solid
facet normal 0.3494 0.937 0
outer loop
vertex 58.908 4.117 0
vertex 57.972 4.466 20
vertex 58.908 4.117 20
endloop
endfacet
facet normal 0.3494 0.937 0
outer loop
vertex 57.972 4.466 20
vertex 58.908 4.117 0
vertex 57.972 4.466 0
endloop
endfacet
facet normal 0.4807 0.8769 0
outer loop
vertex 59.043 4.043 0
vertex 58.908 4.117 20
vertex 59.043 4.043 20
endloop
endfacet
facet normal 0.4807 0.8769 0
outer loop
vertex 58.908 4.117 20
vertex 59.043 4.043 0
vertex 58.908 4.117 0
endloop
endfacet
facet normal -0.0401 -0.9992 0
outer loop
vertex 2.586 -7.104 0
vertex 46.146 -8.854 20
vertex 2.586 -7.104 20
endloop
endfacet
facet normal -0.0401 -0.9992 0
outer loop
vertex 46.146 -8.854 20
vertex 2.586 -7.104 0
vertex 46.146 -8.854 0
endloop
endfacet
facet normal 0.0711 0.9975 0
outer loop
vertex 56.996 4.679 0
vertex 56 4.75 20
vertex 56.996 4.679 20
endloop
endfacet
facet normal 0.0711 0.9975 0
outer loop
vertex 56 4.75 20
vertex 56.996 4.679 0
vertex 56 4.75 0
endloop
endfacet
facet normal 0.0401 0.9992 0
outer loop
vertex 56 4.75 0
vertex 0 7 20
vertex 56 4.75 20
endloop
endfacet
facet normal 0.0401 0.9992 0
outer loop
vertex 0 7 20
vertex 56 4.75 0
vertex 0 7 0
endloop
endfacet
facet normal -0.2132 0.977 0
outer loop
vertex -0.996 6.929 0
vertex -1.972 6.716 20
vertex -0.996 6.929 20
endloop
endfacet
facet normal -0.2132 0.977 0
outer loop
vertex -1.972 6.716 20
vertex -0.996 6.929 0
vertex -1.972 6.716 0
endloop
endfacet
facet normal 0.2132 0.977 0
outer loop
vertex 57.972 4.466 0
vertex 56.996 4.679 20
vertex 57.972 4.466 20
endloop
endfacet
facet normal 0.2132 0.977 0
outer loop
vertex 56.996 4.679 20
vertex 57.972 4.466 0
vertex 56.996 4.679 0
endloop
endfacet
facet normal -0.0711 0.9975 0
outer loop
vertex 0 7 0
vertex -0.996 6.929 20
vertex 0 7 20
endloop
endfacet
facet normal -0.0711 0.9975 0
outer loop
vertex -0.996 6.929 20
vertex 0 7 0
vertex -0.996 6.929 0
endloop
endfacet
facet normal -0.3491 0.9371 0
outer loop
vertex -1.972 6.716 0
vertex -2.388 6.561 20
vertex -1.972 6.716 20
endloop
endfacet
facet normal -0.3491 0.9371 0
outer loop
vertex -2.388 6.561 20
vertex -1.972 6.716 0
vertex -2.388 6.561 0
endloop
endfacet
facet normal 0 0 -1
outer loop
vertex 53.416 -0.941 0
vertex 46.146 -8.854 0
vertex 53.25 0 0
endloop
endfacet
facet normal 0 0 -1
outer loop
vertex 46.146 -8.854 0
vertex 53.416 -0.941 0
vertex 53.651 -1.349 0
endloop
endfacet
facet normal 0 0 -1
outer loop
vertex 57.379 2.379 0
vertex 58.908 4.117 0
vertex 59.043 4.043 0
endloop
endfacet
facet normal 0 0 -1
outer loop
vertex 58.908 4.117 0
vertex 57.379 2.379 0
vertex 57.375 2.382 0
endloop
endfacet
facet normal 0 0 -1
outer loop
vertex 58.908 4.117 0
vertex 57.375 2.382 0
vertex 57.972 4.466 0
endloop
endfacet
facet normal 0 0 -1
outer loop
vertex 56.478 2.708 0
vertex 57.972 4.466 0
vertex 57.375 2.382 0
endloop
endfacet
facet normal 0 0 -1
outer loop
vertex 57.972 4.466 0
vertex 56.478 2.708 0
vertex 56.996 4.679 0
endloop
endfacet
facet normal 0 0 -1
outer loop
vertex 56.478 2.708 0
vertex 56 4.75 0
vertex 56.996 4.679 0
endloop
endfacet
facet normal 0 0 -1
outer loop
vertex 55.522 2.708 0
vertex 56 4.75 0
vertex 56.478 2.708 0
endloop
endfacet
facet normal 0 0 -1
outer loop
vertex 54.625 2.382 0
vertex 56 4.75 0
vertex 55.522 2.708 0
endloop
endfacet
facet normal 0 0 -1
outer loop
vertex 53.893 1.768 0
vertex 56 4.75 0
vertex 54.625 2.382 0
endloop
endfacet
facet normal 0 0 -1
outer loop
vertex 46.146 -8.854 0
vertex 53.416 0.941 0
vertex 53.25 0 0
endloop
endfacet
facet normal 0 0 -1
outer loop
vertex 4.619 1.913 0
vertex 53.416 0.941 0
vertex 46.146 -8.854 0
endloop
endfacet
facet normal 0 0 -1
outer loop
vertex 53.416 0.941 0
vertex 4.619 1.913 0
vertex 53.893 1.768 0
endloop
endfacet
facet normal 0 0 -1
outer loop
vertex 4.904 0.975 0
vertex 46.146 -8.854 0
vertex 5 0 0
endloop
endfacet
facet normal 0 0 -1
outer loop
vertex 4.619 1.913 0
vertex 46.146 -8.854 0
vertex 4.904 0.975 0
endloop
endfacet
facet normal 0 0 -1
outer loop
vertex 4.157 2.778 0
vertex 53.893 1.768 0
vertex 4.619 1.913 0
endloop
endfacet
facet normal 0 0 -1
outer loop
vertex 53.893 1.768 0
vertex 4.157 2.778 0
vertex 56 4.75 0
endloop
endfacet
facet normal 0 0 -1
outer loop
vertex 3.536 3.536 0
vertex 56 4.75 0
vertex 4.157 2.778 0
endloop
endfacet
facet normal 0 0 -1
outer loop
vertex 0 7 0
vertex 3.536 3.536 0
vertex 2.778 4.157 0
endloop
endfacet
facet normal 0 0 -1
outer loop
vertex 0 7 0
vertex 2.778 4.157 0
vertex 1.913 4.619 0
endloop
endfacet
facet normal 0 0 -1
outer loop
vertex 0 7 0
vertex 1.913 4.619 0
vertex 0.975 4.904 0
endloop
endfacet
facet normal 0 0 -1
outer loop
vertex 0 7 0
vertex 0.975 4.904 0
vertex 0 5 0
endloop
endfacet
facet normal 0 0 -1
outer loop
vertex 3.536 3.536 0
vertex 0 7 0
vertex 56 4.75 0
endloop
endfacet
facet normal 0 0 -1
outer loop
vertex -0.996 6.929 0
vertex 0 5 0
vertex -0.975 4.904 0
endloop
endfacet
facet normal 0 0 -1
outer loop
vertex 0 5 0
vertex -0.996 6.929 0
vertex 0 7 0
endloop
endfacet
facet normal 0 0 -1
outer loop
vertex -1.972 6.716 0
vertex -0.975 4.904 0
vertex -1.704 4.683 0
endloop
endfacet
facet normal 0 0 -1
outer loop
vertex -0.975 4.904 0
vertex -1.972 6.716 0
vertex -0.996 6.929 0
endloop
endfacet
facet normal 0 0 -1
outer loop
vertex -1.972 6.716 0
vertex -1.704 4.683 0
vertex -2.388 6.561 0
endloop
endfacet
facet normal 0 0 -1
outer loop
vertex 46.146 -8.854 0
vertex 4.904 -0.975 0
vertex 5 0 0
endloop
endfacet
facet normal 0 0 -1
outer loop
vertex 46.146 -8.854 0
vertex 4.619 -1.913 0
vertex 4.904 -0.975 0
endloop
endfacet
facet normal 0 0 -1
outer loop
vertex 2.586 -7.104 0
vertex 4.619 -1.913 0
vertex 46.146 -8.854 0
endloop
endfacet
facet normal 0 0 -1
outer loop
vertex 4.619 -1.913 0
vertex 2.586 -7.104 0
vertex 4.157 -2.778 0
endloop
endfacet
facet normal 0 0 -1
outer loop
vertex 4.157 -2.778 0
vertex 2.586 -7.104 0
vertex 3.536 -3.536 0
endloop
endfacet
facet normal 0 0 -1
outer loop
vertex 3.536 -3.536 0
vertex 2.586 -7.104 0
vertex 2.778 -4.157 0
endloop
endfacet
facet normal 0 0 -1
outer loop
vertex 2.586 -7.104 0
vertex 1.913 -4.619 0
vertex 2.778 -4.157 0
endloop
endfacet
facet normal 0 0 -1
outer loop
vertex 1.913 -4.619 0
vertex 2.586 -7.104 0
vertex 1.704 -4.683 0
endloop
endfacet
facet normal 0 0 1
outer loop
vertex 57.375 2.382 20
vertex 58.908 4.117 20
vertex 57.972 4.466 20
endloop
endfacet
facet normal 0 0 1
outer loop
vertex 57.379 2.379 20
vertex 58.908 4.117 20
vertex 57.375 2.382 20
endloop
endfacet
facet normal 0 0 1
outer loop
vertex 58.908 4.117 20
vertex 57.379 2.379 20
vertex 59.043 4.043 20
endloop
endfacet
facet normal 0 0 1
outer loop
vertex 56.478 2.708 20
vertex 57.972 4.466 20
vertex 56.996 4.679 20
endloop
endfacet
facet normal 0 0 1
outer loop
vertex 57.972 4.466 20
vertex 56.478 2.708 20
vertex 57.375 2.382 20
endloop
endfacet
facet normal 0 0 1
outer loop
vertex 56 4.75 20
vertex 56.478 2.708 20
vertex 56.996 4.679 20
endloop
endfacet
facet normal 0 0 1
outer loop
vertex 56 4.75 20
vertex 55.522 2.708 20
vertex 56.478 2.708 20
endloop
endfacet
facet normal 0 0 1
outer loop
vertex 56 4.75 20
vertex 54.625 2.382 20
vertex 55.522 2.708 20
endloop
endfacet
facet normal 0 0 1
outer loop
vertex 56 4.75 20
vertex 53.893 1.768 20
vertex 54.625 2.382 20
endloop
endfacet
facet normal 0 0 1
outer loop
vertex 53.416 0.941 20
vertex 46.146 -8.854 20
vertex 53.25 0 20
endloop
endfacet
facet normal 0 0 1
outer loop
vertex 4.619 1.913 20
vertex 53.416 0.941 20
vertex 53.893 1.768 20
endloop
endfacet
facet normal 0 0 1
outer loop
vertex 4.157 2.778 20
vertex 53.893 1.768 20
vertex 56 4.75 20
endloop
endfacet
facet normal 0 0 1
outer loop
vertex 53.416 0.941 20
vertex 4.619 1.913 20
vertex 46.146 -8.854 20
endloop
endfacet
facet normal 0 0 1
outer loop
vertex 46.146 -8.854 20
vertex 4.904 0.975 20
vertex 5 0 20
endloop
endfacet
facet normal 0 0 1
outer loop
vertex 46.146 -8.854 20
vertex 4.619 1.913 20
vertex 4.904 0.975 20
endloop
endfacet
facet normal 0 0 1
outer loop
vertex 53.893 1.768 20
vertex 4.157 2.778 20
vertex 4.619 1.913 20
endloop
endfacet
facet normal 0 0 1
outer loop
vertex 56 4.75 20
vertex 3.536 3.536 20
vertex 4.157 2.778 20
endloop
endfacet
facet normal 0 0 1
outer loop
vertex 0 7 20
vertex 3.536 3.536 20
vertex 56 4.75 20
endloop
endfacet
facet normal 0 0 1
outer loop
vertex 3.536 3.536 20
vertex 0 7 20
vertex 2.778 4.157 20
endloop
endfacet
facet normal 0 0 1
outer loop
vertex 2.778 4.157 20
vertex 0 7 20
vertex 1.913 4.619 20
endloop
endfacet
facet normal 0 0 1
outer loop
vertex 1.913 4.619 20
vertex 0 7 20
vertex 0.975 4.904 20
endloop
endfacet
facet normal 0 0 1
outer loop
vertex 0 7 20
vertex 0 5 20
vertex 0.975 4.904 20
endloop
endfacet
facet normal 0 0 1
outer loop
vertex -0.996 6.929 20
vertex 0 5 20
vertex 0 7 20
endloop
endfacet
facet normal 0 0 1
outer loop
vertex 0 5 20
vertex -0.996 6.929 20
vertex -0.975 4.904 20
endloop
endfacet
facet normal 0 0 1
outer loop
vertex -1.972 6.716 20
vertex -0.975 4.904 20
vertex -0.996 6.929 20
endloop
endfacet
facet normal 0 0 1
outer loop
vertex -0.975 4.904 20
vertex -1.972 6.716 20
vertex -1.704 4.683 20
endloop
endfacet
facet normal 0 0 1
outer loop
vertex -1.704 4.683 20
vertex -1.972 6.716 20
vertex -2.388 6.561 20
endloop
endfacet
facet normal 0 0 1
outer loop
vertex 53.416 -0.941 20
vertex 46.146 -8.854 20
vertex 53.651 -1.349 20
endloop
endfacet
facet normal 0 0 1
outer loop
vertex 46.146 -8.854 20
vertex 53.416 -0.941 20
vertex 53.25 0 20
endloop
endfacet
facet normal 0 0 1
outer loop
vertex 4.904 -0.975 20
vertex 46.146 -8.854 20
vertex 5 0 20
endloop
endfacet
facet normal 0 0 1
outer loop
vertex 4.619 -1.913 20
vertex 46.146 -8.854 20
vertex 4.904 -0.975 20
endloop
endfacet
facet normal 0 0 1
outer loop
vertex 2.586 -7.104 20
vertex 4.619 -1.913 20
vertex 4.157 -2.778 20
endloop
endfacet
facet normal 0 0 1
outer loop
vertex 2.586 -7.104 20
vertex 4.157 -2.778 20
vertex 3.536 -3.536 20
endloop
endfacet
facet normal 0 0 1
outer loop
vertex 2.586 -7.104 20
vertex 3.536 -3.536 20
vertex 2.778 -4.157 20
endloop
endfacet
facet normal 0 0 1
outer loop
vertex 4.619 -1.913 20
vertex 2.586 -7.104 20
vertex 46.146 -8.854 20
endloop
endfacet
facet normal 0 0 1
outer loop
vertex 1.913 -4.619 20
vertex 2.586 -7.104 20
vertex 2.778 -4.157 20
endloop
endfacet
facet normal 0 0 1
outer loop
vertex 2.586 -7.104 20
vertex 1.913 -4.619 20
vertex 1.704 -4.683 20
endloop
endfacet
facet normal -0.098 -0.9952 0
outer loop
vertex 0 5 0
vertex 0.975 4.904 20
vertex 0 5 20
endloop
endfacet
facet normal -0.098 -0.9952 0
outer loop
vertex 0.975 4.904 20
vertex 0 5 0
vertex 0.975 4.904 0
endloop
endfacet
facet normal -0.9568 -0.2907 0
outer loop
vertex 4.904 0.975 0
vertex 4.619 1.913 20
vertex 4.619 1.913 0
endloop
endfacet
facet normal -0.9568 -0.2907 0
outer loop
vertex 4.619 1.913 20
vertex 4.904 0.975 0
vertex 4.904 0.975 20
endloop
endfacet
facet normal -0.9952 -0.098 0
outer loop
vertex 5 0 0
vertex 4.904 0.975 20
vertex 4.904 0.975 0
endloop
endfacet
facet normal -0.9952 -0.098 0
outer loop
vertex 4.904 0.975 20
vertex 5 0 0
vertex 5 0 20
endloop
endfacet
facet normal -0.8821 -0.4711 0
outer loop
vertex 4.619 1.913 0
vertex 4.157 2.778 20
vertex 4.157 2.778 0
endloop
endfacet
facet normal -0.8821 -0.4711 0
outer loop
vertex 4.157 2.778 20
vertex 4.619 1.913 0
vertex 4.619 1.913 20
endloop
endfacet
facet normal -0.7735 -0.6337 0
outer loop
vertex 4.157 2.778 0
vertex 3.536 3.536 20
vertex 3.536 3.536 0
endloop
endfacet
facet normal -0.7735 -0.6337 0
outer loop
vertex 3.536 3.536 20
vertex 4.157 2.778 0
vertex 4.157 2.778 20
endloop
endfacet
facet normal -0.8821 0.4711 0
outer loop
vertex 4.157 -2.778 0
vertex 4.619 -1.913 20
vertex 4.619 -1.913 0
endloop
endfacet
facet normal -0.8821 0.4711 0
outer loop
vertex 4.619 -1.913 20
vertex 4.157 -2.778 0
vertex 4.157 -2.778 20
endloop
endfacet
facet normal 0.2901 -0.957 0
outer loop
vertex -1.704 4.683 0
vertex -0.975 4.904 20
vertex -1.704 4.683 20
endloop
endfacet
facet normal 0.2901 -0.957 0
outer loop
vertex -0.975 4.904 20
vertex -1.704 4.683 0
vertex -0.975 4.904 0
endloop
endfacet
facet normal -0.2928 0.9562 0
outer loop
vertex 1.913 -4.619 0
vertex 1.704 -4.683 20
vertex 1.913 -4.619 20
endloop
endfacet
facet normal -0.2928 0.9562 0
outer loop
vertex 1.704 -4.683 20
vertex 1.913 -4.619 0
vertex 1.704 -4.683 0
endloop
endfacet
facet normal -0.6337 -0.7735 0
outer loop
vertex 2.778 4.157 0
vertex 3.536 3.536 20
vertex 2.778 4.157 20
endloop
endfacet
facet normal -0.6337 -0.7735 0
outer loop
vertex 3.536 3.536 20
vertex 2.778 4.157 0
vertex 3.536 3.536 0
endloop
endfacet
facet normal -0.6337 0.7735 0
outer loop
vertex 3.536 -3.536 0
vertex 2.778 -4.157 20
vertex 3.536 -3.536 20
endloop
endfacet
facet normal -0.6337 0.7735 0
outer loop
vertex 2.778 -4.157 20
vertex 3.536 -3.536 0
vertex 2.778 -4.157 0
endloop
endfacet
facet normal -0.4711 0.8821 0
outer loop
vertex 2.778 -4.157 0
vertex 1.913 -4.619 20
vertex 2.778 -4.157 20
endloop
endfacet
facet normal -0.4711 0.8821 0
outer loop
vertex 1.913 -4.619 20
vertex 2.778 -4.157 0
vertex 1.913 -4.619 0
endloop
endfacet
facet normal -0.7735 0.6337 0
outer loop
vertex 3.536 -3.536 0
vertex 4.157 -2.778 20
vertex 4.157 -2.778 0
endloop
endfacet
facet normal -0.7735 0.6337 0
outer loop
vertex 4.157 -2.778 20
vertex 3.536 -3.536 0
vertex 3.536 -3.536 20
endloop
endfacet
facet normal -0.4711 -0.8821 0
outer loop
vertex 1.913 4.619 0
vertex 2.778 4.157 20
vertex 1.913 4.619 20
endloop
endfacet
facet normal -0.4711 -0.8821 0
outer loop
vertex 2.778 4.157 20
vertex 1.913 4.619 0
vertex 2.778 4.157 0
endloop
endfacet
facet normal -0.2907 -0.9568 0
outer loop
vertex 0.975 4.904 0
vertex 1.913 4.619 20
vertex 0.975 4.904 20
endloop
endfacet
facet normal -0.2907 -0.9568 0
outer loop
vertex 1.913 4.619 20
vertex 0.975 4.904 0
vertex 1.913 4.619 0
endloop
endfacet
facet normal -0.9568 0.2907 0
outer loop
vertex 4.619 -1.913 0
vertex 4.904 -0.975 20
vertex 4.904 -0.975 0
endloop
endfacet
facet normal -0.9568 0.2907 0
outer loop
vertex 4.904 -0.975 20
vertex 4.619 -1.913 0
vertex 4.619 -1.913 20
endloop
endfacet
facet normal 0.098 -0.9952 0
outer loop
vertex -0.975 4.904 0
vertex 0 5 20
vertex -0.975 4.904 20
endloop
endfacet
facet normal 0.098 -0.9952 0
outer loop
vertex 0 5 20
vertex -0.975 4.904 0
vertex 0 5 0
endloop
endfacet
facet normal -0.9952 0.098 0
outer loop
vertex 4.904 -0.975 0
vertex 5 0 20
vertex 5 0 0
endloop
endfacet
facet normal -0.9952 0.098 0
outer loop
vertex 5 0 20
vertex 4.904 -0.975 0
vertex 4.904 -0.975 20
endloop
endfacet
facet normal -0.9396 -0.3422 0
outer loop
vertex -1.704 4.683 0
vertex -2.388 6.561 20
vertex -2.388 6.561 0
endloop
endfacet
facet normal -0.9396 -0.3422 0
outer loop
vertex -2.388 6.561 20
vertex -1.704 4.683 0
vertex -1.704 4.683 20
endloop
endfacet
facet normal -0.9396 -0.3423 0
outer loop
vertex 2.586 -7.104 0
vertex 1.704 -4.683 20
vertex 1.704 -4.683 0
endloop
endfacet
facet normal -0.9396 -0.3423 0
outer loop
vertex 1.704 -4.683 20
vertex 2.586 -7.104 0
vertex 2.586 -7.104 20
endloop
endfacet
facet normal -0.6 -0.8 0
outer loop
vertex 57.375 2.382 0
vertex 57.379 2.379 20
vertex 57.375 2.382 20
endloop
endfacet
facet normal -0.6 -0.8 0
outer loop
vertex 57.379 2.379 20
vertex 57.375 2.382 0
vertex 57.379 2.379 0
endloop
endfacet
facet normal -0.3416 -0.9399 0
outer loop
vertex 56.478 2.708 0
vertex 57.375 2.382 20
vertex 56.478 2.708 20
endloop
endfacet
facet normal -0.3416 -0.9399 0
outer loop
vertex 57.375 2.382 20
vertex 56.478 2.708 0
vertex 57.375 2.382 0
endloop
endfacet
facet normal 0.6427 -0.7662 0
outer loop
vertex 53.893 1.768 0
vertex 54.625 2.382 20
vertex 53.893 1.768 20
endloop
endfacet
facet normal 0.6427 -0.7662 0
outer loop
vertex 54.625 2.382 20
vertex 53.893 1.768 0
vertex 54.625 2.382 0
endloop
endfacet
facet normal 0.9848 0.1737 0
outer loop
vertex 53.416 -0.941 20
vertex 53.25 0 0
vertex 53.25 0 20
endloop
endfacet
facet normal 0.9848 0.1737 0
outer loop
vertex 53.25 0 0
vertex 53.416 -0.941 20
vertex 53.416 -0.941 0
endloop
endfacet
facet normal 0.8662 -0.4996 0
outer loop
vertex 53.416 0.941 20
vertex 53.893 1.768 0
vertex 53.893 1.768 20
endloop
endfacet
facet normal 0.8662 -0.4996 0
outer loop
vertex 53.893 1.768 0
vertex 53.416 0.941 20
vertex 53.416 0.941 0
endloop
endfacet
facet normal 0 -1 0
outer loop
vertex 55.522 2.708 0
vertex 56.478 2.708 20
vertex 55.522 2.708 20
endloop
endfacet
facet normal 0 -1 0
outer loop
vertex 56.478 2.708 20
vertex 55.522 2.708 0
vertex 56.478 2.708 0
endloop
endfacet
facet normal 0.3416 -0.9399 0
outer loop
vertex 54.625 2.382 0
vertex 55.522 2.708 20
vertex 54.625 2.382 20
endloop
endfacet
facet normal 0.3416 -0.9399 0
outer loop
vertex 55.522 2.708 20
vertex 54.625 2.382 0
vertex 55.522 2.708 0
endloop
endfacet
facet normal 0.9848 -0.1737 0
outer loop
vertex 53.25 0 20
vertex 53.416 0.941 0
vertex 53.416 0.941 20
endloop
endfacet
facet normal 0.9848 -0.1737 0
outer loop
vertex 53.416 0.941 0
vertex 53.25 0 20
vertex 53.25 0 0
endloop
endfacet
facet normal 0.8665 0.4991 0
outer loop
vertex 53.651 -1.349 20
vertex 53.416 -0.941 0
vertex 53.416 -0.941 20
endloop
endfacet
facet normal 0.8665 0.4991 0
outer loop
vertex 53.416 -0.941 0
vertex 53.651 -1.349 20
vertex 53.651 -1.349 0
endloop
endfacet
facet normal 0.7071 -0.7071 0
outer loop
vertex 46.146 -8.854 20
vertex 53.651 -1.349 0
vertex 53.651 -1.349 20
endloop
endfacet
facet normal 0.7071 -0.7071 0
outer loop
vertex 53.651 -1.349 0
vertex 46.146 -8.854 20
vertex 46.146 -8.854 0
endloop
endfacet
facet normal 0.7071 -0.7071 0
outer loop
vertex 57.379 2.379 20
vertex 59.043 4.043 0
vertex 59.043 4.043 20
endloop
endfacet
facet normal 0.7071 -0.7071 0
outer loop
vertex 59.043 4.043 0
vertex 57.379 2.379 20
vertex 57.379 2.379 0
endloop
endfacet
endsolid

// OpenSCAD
// file: config.scad
//$fs=$fs/2;
//$fa=$fa/2;

r4 = 2.2;
r8 = 4.2;
r10 = 5.2;

layer_height = 0.25;

switch_d = 9.6;

nema17_r_vis = 15.5;
nema17_r_centre = 11.5;
nema17_h_centre = 2;
nema17_h = 43;
nema17_l = 40;

boite_ui_largeur = 28.5;
boite_ui_l = 46;

support_laser = 24;

r3 = 1.75;
r3_2d = 1.5;
r3_vis = 1.65;
r3_head = 3.6;
m3_r = r3;
m3_nut_d = 7;
m3_nut_d2 = 6.2;
m3_nut_h = 3;

m4_r = 2.3;
m4_nut_d = 8.4;
m4_nut_d2 = 7.5;
m4_nut_h = 3.5;

608_r = 23/2;
608_h = 8;

laser_printer_l = 609;
laser_printer_lg = 456;


module support_nut(d=3, l_screw1 = 20, l_screw2 = 20, l_nut = 20, h_screw2 = 0.2){
    if(d==3){
        screw_r = r3;
        nut_r = m3_nut_d/2;
        nut_h = m3_nut_h;
        cylinder(nut_h, r = nut_r, $fn = 6, center = true);
        translate([0, 0, -l_screw1])cylinder(l_screw1 +1, r = screw_r, $fn = 8);
        translate([0, 0, m3_nut_h/2+ h_screw2])cylinder(l_screw2, r = screw_r, $fn = 8);
        l = m3_nut_d*cos(30);
        translate([0, -l/2, -nut_h/2]) cube([l_nut, l,nut_h]);
    } else if(d==4){
        screw_r = r4;
        nut_r = m4_nut_d/2;
        nut_h = m4_nut_h;
        cylinder(nut_h, r = nut_r, $fn = 6, center = true);
        translate([0, 0, -l_screw1])cylinder(l_screw1 +1, r = screw_r, $fn = 8);
        translate([0, 0, m4_nut_h/2+ h_screw2])cylinder(l_screw2, r = screw_r, $fn = 8);
        l = m4_nut_d*cos(30);
        translate([0, -l/2, -nut_h/2]) cube([l_nut, l,nut_h]);
    }
}


module nut(d=3, center = false){
    nut_r = m3_nut_d/2;
    nut_h = m3_nut_h;
    if(d==3){
        nut_r = m3_nut_d/2;
        nut_h = m3_nut_h;
    } 
    cylinder(nut_h, r = nut_r, $fn = 6, center = center);
}



module m3(h, nut = false, head = false){
    cylinder(h, m3_r, m3_r, $fn=16);
    if(nut){
        cylinder(m3_nut_h, r = m3_nut_d/2, $fn = 6);
    }
}

module m3_nut(h){
    cylinder(m3_nut_h, r = m3_nut_d/2, $fn = 6);
    translate([0, -m3_nut_d2/2, 0]) cube([h, m3_nut_d2, m3_nut_h]);
}

module m4(h, nut = false, head = false){
    cylinder(h, m4_r, m4_r);
    if(nut){
        cylinder(m4_nut_h, r = m4_nut_d/2, $fn = 6);
    }
}

module m5(h, nut = false, head = false){
    cylinder(h, r = 2.7);
}

m8_nut_d = 15;
m8_nut_d2 = 13;
m8_nut_h = 6.5;
module m8(h, nut = false, head = false){
    cylinder(h, r = r8);
    if(nut){
        cylinder(m8_nut_h, r = m8_nut_d/2, $fn = 6);
    }
}

module cube_arrondi(x, y, z, r=2){
    hull(){
        translate([(x/2-r), (y/2-r), 0]) cylinder(z,r=r);
        translate([(x/2-r), -(y/2-r), 0]) cylinder(z,r=r);
        translate([-(x/2-r), (y/2-r), 0]) cylinder(z,r=r);
        translate([-(x/2-r), -(y/2-r), 0]) cylinder(z,r=r);
    }
}

module demi_glissiere(r, l, h){
    cylinder(h, r, r);
    translate([-r, 0, 0]) cube([r*2, l, h]);
}


module nema17_2d(){
    nema17_l = 43;
    nema17_h = 6;
    polygon([[0,nema17_h], [nema17_h,0]
            , [nema17_l-nema17_h,0],[nema17_l,nema17_h]
            , [nema17_l,nema17_l-nema17_h],[nema17_l-nema17_h,nema17_l]
            , [8,nema17_l],[0,nema17_l-nema17_h] ]);
}

module nema17_2d2(){
    translate([nema17_r_vis, nema17_r_vis] ) circle(r3_2d);
    translate([nema17_r_vis, -nema17_r_vis] ) circle(r3_2d);
    translate([-nema17_r_vis, nema17_r_vis] ) circle(r3_2d);
    translate([-nema17_r_vis, -nema17_r_vis] ) circle(r3_2d);
    circle(nema17_r_centre);
}


module nema17(){
    translate([-nema17_h/2, -nema17_h/2, -nema17_l/2] ) linear_extrude(nema17_l) nema17_2d();
    
    h = nema17_h/2+6;
    translate([nema17_r_vis, nema17_r_vis, 0] )rotate([0, 0, 0]) cylinder(h, r = r3);
    translate([nema17_r_vis, -nema17_r_vis, 0] )rotate([0, 0, 0]) cylinder(h, r = r3);
    translate([-nema17_r_vis, nema17_r_vis, 0] )rotate([0, 0, 0]) cylinder(h, r = r3);
    translate([-nema17_r_vis, -nema17_r_vis, 0] )rotate([0, 0, 0]) cylinder(h, r = r3);
    cylinder(h, nema17_r_centre, nema17_r_centre);
    cylinder(h+14, r = 8);
    
    translate([-8.5, 0, -nema17_l/2] ) cube([17,30, 10]);
}

module corner(l_corner, h_corner, lg_corner){
    translate([0, lg_corner, 0]) rotate([90, 0, 0]) linear_extrude(lg_corner) polygon([[0,0], [l_corner, 0], [0, h_corner]]);
}


/**
 * 2D
 **/

module m3_2d(){
    circle(r3_2d);
}


module cran_x(_l, e, cran, inv){
    difference(){
        square([_l, e]);
        if(inv){
            for(i=[-round(_l/cran):round(_l/cran)]){
                translate([_l/2 + cran/2 - 2*i*cran, -1]) square([cran, e+2]);
            }
        }else{
            for(i=[-round(_l/cran):round(_l/cran)]){
                translate([_l/2 - cran/2 - 2*i*cran, -1]) square([cran, e+2]);
            }
        }
    }
}

module cran_y(_l, e, cran, inv){
    translate([e, 0]) rotate([0, 0, 90]) cran_x(_l, e, cran, inv); 
}

module whole_2d(type_vis){
    if(type_vis == 3){
        circle(1.5);
    } else if(type_vis == 4){
        circle(2);
    } else {
        echo("whole_2d " + type_vis);
    }
}

module nuts_2d(type_vis){
    if(type_vis == 3){
        translate([-1.5, 0])square([3, 20]);
        translate([-5.5/2, 10])square([5.5, 2.5]);
    } else if(type_vis == 4){
        translate([-2, 0])square([4, 30]);
        translate([-7/2, 20])square([7, 3.5]);
    } else {
        echo("nuts_2d " + type_vis);
    }
}

module cran_x_vis(_l, e, cran, type_vis = 3, trous = [0.1, 0.5, 0.9]){
    difference(){
        square([_l, e]);
        for(i=[-round(_l/cran):round(_l/cran)]){
                translate([_l/2 - cran/2 - 2*i*cran, -1]) square([cran, e+2]);
            }
        
    }
    for(i = trous){
        j = round((i-0.5)*_l/(2*cran));
        translate([_l/2  - 2*j*cran, e/2]) whole_2d(type_vis);
    }
}

module cran_x_nuts(_l, e, cran, type_vis = 3, trous = [0.1, 0.5, 0.9]){
    difference(){
        square([_l, e]);
        for(i=[-round(_l/cran):round(_l/cran)]){
                translate([_l/2 + cran/2 - 2*i*cran, -1]) square([cran, e+2]);
        }
    }
    for(i = trous){
        j = round((i-0.5)*_l/(2*cran));
        translate([_l/2  - 2*j*cran, e/2]) nuts_2d(type_vis);
    }
}

module cran_y_vis(_l, e, cran, type_vis = 3, trous = [0.1, 0.5, 0.9]){
    translate([e, 0]) rotate([0, 0, 90]) cran_x_vis(_l, e, cran, type_vis, trous);
}

module cran_y_nuts(_l, e, cran, type_vis = 3, trous = [0.1, 0.5, 0.9]){
    translate([0, _l]) rotate([0, 0, -90]) cran_x_nuts(_l, e, cran, type_vis, trous);
}
// main file
include <config.scad>


$fs=$fs/2;
$fa=$fa/2;

r1 = 5;
r2 = 5.5/2;

l=56;
l2=56-1;
h=20;
e=2;

difference(){
    hull(){
        cylinder(r=r1+e, h);

        translate([l, r2-r1, 0])cylinder(r=r1+e, h);
    }
    translate([0, 0, -1])cylinder(r=r1, h+2);
    
    rotate([0,0,90+20])translate([-10, 0, -1])cube([20,20,h+2]);
    translate([l, 0, -1])cylinder(r=r2, h+2);
    translate([l2, 0, 0])rotate([0,0,-90-45])translate([-20, 0, -1])cube([40,40,h+2]);
}
    
